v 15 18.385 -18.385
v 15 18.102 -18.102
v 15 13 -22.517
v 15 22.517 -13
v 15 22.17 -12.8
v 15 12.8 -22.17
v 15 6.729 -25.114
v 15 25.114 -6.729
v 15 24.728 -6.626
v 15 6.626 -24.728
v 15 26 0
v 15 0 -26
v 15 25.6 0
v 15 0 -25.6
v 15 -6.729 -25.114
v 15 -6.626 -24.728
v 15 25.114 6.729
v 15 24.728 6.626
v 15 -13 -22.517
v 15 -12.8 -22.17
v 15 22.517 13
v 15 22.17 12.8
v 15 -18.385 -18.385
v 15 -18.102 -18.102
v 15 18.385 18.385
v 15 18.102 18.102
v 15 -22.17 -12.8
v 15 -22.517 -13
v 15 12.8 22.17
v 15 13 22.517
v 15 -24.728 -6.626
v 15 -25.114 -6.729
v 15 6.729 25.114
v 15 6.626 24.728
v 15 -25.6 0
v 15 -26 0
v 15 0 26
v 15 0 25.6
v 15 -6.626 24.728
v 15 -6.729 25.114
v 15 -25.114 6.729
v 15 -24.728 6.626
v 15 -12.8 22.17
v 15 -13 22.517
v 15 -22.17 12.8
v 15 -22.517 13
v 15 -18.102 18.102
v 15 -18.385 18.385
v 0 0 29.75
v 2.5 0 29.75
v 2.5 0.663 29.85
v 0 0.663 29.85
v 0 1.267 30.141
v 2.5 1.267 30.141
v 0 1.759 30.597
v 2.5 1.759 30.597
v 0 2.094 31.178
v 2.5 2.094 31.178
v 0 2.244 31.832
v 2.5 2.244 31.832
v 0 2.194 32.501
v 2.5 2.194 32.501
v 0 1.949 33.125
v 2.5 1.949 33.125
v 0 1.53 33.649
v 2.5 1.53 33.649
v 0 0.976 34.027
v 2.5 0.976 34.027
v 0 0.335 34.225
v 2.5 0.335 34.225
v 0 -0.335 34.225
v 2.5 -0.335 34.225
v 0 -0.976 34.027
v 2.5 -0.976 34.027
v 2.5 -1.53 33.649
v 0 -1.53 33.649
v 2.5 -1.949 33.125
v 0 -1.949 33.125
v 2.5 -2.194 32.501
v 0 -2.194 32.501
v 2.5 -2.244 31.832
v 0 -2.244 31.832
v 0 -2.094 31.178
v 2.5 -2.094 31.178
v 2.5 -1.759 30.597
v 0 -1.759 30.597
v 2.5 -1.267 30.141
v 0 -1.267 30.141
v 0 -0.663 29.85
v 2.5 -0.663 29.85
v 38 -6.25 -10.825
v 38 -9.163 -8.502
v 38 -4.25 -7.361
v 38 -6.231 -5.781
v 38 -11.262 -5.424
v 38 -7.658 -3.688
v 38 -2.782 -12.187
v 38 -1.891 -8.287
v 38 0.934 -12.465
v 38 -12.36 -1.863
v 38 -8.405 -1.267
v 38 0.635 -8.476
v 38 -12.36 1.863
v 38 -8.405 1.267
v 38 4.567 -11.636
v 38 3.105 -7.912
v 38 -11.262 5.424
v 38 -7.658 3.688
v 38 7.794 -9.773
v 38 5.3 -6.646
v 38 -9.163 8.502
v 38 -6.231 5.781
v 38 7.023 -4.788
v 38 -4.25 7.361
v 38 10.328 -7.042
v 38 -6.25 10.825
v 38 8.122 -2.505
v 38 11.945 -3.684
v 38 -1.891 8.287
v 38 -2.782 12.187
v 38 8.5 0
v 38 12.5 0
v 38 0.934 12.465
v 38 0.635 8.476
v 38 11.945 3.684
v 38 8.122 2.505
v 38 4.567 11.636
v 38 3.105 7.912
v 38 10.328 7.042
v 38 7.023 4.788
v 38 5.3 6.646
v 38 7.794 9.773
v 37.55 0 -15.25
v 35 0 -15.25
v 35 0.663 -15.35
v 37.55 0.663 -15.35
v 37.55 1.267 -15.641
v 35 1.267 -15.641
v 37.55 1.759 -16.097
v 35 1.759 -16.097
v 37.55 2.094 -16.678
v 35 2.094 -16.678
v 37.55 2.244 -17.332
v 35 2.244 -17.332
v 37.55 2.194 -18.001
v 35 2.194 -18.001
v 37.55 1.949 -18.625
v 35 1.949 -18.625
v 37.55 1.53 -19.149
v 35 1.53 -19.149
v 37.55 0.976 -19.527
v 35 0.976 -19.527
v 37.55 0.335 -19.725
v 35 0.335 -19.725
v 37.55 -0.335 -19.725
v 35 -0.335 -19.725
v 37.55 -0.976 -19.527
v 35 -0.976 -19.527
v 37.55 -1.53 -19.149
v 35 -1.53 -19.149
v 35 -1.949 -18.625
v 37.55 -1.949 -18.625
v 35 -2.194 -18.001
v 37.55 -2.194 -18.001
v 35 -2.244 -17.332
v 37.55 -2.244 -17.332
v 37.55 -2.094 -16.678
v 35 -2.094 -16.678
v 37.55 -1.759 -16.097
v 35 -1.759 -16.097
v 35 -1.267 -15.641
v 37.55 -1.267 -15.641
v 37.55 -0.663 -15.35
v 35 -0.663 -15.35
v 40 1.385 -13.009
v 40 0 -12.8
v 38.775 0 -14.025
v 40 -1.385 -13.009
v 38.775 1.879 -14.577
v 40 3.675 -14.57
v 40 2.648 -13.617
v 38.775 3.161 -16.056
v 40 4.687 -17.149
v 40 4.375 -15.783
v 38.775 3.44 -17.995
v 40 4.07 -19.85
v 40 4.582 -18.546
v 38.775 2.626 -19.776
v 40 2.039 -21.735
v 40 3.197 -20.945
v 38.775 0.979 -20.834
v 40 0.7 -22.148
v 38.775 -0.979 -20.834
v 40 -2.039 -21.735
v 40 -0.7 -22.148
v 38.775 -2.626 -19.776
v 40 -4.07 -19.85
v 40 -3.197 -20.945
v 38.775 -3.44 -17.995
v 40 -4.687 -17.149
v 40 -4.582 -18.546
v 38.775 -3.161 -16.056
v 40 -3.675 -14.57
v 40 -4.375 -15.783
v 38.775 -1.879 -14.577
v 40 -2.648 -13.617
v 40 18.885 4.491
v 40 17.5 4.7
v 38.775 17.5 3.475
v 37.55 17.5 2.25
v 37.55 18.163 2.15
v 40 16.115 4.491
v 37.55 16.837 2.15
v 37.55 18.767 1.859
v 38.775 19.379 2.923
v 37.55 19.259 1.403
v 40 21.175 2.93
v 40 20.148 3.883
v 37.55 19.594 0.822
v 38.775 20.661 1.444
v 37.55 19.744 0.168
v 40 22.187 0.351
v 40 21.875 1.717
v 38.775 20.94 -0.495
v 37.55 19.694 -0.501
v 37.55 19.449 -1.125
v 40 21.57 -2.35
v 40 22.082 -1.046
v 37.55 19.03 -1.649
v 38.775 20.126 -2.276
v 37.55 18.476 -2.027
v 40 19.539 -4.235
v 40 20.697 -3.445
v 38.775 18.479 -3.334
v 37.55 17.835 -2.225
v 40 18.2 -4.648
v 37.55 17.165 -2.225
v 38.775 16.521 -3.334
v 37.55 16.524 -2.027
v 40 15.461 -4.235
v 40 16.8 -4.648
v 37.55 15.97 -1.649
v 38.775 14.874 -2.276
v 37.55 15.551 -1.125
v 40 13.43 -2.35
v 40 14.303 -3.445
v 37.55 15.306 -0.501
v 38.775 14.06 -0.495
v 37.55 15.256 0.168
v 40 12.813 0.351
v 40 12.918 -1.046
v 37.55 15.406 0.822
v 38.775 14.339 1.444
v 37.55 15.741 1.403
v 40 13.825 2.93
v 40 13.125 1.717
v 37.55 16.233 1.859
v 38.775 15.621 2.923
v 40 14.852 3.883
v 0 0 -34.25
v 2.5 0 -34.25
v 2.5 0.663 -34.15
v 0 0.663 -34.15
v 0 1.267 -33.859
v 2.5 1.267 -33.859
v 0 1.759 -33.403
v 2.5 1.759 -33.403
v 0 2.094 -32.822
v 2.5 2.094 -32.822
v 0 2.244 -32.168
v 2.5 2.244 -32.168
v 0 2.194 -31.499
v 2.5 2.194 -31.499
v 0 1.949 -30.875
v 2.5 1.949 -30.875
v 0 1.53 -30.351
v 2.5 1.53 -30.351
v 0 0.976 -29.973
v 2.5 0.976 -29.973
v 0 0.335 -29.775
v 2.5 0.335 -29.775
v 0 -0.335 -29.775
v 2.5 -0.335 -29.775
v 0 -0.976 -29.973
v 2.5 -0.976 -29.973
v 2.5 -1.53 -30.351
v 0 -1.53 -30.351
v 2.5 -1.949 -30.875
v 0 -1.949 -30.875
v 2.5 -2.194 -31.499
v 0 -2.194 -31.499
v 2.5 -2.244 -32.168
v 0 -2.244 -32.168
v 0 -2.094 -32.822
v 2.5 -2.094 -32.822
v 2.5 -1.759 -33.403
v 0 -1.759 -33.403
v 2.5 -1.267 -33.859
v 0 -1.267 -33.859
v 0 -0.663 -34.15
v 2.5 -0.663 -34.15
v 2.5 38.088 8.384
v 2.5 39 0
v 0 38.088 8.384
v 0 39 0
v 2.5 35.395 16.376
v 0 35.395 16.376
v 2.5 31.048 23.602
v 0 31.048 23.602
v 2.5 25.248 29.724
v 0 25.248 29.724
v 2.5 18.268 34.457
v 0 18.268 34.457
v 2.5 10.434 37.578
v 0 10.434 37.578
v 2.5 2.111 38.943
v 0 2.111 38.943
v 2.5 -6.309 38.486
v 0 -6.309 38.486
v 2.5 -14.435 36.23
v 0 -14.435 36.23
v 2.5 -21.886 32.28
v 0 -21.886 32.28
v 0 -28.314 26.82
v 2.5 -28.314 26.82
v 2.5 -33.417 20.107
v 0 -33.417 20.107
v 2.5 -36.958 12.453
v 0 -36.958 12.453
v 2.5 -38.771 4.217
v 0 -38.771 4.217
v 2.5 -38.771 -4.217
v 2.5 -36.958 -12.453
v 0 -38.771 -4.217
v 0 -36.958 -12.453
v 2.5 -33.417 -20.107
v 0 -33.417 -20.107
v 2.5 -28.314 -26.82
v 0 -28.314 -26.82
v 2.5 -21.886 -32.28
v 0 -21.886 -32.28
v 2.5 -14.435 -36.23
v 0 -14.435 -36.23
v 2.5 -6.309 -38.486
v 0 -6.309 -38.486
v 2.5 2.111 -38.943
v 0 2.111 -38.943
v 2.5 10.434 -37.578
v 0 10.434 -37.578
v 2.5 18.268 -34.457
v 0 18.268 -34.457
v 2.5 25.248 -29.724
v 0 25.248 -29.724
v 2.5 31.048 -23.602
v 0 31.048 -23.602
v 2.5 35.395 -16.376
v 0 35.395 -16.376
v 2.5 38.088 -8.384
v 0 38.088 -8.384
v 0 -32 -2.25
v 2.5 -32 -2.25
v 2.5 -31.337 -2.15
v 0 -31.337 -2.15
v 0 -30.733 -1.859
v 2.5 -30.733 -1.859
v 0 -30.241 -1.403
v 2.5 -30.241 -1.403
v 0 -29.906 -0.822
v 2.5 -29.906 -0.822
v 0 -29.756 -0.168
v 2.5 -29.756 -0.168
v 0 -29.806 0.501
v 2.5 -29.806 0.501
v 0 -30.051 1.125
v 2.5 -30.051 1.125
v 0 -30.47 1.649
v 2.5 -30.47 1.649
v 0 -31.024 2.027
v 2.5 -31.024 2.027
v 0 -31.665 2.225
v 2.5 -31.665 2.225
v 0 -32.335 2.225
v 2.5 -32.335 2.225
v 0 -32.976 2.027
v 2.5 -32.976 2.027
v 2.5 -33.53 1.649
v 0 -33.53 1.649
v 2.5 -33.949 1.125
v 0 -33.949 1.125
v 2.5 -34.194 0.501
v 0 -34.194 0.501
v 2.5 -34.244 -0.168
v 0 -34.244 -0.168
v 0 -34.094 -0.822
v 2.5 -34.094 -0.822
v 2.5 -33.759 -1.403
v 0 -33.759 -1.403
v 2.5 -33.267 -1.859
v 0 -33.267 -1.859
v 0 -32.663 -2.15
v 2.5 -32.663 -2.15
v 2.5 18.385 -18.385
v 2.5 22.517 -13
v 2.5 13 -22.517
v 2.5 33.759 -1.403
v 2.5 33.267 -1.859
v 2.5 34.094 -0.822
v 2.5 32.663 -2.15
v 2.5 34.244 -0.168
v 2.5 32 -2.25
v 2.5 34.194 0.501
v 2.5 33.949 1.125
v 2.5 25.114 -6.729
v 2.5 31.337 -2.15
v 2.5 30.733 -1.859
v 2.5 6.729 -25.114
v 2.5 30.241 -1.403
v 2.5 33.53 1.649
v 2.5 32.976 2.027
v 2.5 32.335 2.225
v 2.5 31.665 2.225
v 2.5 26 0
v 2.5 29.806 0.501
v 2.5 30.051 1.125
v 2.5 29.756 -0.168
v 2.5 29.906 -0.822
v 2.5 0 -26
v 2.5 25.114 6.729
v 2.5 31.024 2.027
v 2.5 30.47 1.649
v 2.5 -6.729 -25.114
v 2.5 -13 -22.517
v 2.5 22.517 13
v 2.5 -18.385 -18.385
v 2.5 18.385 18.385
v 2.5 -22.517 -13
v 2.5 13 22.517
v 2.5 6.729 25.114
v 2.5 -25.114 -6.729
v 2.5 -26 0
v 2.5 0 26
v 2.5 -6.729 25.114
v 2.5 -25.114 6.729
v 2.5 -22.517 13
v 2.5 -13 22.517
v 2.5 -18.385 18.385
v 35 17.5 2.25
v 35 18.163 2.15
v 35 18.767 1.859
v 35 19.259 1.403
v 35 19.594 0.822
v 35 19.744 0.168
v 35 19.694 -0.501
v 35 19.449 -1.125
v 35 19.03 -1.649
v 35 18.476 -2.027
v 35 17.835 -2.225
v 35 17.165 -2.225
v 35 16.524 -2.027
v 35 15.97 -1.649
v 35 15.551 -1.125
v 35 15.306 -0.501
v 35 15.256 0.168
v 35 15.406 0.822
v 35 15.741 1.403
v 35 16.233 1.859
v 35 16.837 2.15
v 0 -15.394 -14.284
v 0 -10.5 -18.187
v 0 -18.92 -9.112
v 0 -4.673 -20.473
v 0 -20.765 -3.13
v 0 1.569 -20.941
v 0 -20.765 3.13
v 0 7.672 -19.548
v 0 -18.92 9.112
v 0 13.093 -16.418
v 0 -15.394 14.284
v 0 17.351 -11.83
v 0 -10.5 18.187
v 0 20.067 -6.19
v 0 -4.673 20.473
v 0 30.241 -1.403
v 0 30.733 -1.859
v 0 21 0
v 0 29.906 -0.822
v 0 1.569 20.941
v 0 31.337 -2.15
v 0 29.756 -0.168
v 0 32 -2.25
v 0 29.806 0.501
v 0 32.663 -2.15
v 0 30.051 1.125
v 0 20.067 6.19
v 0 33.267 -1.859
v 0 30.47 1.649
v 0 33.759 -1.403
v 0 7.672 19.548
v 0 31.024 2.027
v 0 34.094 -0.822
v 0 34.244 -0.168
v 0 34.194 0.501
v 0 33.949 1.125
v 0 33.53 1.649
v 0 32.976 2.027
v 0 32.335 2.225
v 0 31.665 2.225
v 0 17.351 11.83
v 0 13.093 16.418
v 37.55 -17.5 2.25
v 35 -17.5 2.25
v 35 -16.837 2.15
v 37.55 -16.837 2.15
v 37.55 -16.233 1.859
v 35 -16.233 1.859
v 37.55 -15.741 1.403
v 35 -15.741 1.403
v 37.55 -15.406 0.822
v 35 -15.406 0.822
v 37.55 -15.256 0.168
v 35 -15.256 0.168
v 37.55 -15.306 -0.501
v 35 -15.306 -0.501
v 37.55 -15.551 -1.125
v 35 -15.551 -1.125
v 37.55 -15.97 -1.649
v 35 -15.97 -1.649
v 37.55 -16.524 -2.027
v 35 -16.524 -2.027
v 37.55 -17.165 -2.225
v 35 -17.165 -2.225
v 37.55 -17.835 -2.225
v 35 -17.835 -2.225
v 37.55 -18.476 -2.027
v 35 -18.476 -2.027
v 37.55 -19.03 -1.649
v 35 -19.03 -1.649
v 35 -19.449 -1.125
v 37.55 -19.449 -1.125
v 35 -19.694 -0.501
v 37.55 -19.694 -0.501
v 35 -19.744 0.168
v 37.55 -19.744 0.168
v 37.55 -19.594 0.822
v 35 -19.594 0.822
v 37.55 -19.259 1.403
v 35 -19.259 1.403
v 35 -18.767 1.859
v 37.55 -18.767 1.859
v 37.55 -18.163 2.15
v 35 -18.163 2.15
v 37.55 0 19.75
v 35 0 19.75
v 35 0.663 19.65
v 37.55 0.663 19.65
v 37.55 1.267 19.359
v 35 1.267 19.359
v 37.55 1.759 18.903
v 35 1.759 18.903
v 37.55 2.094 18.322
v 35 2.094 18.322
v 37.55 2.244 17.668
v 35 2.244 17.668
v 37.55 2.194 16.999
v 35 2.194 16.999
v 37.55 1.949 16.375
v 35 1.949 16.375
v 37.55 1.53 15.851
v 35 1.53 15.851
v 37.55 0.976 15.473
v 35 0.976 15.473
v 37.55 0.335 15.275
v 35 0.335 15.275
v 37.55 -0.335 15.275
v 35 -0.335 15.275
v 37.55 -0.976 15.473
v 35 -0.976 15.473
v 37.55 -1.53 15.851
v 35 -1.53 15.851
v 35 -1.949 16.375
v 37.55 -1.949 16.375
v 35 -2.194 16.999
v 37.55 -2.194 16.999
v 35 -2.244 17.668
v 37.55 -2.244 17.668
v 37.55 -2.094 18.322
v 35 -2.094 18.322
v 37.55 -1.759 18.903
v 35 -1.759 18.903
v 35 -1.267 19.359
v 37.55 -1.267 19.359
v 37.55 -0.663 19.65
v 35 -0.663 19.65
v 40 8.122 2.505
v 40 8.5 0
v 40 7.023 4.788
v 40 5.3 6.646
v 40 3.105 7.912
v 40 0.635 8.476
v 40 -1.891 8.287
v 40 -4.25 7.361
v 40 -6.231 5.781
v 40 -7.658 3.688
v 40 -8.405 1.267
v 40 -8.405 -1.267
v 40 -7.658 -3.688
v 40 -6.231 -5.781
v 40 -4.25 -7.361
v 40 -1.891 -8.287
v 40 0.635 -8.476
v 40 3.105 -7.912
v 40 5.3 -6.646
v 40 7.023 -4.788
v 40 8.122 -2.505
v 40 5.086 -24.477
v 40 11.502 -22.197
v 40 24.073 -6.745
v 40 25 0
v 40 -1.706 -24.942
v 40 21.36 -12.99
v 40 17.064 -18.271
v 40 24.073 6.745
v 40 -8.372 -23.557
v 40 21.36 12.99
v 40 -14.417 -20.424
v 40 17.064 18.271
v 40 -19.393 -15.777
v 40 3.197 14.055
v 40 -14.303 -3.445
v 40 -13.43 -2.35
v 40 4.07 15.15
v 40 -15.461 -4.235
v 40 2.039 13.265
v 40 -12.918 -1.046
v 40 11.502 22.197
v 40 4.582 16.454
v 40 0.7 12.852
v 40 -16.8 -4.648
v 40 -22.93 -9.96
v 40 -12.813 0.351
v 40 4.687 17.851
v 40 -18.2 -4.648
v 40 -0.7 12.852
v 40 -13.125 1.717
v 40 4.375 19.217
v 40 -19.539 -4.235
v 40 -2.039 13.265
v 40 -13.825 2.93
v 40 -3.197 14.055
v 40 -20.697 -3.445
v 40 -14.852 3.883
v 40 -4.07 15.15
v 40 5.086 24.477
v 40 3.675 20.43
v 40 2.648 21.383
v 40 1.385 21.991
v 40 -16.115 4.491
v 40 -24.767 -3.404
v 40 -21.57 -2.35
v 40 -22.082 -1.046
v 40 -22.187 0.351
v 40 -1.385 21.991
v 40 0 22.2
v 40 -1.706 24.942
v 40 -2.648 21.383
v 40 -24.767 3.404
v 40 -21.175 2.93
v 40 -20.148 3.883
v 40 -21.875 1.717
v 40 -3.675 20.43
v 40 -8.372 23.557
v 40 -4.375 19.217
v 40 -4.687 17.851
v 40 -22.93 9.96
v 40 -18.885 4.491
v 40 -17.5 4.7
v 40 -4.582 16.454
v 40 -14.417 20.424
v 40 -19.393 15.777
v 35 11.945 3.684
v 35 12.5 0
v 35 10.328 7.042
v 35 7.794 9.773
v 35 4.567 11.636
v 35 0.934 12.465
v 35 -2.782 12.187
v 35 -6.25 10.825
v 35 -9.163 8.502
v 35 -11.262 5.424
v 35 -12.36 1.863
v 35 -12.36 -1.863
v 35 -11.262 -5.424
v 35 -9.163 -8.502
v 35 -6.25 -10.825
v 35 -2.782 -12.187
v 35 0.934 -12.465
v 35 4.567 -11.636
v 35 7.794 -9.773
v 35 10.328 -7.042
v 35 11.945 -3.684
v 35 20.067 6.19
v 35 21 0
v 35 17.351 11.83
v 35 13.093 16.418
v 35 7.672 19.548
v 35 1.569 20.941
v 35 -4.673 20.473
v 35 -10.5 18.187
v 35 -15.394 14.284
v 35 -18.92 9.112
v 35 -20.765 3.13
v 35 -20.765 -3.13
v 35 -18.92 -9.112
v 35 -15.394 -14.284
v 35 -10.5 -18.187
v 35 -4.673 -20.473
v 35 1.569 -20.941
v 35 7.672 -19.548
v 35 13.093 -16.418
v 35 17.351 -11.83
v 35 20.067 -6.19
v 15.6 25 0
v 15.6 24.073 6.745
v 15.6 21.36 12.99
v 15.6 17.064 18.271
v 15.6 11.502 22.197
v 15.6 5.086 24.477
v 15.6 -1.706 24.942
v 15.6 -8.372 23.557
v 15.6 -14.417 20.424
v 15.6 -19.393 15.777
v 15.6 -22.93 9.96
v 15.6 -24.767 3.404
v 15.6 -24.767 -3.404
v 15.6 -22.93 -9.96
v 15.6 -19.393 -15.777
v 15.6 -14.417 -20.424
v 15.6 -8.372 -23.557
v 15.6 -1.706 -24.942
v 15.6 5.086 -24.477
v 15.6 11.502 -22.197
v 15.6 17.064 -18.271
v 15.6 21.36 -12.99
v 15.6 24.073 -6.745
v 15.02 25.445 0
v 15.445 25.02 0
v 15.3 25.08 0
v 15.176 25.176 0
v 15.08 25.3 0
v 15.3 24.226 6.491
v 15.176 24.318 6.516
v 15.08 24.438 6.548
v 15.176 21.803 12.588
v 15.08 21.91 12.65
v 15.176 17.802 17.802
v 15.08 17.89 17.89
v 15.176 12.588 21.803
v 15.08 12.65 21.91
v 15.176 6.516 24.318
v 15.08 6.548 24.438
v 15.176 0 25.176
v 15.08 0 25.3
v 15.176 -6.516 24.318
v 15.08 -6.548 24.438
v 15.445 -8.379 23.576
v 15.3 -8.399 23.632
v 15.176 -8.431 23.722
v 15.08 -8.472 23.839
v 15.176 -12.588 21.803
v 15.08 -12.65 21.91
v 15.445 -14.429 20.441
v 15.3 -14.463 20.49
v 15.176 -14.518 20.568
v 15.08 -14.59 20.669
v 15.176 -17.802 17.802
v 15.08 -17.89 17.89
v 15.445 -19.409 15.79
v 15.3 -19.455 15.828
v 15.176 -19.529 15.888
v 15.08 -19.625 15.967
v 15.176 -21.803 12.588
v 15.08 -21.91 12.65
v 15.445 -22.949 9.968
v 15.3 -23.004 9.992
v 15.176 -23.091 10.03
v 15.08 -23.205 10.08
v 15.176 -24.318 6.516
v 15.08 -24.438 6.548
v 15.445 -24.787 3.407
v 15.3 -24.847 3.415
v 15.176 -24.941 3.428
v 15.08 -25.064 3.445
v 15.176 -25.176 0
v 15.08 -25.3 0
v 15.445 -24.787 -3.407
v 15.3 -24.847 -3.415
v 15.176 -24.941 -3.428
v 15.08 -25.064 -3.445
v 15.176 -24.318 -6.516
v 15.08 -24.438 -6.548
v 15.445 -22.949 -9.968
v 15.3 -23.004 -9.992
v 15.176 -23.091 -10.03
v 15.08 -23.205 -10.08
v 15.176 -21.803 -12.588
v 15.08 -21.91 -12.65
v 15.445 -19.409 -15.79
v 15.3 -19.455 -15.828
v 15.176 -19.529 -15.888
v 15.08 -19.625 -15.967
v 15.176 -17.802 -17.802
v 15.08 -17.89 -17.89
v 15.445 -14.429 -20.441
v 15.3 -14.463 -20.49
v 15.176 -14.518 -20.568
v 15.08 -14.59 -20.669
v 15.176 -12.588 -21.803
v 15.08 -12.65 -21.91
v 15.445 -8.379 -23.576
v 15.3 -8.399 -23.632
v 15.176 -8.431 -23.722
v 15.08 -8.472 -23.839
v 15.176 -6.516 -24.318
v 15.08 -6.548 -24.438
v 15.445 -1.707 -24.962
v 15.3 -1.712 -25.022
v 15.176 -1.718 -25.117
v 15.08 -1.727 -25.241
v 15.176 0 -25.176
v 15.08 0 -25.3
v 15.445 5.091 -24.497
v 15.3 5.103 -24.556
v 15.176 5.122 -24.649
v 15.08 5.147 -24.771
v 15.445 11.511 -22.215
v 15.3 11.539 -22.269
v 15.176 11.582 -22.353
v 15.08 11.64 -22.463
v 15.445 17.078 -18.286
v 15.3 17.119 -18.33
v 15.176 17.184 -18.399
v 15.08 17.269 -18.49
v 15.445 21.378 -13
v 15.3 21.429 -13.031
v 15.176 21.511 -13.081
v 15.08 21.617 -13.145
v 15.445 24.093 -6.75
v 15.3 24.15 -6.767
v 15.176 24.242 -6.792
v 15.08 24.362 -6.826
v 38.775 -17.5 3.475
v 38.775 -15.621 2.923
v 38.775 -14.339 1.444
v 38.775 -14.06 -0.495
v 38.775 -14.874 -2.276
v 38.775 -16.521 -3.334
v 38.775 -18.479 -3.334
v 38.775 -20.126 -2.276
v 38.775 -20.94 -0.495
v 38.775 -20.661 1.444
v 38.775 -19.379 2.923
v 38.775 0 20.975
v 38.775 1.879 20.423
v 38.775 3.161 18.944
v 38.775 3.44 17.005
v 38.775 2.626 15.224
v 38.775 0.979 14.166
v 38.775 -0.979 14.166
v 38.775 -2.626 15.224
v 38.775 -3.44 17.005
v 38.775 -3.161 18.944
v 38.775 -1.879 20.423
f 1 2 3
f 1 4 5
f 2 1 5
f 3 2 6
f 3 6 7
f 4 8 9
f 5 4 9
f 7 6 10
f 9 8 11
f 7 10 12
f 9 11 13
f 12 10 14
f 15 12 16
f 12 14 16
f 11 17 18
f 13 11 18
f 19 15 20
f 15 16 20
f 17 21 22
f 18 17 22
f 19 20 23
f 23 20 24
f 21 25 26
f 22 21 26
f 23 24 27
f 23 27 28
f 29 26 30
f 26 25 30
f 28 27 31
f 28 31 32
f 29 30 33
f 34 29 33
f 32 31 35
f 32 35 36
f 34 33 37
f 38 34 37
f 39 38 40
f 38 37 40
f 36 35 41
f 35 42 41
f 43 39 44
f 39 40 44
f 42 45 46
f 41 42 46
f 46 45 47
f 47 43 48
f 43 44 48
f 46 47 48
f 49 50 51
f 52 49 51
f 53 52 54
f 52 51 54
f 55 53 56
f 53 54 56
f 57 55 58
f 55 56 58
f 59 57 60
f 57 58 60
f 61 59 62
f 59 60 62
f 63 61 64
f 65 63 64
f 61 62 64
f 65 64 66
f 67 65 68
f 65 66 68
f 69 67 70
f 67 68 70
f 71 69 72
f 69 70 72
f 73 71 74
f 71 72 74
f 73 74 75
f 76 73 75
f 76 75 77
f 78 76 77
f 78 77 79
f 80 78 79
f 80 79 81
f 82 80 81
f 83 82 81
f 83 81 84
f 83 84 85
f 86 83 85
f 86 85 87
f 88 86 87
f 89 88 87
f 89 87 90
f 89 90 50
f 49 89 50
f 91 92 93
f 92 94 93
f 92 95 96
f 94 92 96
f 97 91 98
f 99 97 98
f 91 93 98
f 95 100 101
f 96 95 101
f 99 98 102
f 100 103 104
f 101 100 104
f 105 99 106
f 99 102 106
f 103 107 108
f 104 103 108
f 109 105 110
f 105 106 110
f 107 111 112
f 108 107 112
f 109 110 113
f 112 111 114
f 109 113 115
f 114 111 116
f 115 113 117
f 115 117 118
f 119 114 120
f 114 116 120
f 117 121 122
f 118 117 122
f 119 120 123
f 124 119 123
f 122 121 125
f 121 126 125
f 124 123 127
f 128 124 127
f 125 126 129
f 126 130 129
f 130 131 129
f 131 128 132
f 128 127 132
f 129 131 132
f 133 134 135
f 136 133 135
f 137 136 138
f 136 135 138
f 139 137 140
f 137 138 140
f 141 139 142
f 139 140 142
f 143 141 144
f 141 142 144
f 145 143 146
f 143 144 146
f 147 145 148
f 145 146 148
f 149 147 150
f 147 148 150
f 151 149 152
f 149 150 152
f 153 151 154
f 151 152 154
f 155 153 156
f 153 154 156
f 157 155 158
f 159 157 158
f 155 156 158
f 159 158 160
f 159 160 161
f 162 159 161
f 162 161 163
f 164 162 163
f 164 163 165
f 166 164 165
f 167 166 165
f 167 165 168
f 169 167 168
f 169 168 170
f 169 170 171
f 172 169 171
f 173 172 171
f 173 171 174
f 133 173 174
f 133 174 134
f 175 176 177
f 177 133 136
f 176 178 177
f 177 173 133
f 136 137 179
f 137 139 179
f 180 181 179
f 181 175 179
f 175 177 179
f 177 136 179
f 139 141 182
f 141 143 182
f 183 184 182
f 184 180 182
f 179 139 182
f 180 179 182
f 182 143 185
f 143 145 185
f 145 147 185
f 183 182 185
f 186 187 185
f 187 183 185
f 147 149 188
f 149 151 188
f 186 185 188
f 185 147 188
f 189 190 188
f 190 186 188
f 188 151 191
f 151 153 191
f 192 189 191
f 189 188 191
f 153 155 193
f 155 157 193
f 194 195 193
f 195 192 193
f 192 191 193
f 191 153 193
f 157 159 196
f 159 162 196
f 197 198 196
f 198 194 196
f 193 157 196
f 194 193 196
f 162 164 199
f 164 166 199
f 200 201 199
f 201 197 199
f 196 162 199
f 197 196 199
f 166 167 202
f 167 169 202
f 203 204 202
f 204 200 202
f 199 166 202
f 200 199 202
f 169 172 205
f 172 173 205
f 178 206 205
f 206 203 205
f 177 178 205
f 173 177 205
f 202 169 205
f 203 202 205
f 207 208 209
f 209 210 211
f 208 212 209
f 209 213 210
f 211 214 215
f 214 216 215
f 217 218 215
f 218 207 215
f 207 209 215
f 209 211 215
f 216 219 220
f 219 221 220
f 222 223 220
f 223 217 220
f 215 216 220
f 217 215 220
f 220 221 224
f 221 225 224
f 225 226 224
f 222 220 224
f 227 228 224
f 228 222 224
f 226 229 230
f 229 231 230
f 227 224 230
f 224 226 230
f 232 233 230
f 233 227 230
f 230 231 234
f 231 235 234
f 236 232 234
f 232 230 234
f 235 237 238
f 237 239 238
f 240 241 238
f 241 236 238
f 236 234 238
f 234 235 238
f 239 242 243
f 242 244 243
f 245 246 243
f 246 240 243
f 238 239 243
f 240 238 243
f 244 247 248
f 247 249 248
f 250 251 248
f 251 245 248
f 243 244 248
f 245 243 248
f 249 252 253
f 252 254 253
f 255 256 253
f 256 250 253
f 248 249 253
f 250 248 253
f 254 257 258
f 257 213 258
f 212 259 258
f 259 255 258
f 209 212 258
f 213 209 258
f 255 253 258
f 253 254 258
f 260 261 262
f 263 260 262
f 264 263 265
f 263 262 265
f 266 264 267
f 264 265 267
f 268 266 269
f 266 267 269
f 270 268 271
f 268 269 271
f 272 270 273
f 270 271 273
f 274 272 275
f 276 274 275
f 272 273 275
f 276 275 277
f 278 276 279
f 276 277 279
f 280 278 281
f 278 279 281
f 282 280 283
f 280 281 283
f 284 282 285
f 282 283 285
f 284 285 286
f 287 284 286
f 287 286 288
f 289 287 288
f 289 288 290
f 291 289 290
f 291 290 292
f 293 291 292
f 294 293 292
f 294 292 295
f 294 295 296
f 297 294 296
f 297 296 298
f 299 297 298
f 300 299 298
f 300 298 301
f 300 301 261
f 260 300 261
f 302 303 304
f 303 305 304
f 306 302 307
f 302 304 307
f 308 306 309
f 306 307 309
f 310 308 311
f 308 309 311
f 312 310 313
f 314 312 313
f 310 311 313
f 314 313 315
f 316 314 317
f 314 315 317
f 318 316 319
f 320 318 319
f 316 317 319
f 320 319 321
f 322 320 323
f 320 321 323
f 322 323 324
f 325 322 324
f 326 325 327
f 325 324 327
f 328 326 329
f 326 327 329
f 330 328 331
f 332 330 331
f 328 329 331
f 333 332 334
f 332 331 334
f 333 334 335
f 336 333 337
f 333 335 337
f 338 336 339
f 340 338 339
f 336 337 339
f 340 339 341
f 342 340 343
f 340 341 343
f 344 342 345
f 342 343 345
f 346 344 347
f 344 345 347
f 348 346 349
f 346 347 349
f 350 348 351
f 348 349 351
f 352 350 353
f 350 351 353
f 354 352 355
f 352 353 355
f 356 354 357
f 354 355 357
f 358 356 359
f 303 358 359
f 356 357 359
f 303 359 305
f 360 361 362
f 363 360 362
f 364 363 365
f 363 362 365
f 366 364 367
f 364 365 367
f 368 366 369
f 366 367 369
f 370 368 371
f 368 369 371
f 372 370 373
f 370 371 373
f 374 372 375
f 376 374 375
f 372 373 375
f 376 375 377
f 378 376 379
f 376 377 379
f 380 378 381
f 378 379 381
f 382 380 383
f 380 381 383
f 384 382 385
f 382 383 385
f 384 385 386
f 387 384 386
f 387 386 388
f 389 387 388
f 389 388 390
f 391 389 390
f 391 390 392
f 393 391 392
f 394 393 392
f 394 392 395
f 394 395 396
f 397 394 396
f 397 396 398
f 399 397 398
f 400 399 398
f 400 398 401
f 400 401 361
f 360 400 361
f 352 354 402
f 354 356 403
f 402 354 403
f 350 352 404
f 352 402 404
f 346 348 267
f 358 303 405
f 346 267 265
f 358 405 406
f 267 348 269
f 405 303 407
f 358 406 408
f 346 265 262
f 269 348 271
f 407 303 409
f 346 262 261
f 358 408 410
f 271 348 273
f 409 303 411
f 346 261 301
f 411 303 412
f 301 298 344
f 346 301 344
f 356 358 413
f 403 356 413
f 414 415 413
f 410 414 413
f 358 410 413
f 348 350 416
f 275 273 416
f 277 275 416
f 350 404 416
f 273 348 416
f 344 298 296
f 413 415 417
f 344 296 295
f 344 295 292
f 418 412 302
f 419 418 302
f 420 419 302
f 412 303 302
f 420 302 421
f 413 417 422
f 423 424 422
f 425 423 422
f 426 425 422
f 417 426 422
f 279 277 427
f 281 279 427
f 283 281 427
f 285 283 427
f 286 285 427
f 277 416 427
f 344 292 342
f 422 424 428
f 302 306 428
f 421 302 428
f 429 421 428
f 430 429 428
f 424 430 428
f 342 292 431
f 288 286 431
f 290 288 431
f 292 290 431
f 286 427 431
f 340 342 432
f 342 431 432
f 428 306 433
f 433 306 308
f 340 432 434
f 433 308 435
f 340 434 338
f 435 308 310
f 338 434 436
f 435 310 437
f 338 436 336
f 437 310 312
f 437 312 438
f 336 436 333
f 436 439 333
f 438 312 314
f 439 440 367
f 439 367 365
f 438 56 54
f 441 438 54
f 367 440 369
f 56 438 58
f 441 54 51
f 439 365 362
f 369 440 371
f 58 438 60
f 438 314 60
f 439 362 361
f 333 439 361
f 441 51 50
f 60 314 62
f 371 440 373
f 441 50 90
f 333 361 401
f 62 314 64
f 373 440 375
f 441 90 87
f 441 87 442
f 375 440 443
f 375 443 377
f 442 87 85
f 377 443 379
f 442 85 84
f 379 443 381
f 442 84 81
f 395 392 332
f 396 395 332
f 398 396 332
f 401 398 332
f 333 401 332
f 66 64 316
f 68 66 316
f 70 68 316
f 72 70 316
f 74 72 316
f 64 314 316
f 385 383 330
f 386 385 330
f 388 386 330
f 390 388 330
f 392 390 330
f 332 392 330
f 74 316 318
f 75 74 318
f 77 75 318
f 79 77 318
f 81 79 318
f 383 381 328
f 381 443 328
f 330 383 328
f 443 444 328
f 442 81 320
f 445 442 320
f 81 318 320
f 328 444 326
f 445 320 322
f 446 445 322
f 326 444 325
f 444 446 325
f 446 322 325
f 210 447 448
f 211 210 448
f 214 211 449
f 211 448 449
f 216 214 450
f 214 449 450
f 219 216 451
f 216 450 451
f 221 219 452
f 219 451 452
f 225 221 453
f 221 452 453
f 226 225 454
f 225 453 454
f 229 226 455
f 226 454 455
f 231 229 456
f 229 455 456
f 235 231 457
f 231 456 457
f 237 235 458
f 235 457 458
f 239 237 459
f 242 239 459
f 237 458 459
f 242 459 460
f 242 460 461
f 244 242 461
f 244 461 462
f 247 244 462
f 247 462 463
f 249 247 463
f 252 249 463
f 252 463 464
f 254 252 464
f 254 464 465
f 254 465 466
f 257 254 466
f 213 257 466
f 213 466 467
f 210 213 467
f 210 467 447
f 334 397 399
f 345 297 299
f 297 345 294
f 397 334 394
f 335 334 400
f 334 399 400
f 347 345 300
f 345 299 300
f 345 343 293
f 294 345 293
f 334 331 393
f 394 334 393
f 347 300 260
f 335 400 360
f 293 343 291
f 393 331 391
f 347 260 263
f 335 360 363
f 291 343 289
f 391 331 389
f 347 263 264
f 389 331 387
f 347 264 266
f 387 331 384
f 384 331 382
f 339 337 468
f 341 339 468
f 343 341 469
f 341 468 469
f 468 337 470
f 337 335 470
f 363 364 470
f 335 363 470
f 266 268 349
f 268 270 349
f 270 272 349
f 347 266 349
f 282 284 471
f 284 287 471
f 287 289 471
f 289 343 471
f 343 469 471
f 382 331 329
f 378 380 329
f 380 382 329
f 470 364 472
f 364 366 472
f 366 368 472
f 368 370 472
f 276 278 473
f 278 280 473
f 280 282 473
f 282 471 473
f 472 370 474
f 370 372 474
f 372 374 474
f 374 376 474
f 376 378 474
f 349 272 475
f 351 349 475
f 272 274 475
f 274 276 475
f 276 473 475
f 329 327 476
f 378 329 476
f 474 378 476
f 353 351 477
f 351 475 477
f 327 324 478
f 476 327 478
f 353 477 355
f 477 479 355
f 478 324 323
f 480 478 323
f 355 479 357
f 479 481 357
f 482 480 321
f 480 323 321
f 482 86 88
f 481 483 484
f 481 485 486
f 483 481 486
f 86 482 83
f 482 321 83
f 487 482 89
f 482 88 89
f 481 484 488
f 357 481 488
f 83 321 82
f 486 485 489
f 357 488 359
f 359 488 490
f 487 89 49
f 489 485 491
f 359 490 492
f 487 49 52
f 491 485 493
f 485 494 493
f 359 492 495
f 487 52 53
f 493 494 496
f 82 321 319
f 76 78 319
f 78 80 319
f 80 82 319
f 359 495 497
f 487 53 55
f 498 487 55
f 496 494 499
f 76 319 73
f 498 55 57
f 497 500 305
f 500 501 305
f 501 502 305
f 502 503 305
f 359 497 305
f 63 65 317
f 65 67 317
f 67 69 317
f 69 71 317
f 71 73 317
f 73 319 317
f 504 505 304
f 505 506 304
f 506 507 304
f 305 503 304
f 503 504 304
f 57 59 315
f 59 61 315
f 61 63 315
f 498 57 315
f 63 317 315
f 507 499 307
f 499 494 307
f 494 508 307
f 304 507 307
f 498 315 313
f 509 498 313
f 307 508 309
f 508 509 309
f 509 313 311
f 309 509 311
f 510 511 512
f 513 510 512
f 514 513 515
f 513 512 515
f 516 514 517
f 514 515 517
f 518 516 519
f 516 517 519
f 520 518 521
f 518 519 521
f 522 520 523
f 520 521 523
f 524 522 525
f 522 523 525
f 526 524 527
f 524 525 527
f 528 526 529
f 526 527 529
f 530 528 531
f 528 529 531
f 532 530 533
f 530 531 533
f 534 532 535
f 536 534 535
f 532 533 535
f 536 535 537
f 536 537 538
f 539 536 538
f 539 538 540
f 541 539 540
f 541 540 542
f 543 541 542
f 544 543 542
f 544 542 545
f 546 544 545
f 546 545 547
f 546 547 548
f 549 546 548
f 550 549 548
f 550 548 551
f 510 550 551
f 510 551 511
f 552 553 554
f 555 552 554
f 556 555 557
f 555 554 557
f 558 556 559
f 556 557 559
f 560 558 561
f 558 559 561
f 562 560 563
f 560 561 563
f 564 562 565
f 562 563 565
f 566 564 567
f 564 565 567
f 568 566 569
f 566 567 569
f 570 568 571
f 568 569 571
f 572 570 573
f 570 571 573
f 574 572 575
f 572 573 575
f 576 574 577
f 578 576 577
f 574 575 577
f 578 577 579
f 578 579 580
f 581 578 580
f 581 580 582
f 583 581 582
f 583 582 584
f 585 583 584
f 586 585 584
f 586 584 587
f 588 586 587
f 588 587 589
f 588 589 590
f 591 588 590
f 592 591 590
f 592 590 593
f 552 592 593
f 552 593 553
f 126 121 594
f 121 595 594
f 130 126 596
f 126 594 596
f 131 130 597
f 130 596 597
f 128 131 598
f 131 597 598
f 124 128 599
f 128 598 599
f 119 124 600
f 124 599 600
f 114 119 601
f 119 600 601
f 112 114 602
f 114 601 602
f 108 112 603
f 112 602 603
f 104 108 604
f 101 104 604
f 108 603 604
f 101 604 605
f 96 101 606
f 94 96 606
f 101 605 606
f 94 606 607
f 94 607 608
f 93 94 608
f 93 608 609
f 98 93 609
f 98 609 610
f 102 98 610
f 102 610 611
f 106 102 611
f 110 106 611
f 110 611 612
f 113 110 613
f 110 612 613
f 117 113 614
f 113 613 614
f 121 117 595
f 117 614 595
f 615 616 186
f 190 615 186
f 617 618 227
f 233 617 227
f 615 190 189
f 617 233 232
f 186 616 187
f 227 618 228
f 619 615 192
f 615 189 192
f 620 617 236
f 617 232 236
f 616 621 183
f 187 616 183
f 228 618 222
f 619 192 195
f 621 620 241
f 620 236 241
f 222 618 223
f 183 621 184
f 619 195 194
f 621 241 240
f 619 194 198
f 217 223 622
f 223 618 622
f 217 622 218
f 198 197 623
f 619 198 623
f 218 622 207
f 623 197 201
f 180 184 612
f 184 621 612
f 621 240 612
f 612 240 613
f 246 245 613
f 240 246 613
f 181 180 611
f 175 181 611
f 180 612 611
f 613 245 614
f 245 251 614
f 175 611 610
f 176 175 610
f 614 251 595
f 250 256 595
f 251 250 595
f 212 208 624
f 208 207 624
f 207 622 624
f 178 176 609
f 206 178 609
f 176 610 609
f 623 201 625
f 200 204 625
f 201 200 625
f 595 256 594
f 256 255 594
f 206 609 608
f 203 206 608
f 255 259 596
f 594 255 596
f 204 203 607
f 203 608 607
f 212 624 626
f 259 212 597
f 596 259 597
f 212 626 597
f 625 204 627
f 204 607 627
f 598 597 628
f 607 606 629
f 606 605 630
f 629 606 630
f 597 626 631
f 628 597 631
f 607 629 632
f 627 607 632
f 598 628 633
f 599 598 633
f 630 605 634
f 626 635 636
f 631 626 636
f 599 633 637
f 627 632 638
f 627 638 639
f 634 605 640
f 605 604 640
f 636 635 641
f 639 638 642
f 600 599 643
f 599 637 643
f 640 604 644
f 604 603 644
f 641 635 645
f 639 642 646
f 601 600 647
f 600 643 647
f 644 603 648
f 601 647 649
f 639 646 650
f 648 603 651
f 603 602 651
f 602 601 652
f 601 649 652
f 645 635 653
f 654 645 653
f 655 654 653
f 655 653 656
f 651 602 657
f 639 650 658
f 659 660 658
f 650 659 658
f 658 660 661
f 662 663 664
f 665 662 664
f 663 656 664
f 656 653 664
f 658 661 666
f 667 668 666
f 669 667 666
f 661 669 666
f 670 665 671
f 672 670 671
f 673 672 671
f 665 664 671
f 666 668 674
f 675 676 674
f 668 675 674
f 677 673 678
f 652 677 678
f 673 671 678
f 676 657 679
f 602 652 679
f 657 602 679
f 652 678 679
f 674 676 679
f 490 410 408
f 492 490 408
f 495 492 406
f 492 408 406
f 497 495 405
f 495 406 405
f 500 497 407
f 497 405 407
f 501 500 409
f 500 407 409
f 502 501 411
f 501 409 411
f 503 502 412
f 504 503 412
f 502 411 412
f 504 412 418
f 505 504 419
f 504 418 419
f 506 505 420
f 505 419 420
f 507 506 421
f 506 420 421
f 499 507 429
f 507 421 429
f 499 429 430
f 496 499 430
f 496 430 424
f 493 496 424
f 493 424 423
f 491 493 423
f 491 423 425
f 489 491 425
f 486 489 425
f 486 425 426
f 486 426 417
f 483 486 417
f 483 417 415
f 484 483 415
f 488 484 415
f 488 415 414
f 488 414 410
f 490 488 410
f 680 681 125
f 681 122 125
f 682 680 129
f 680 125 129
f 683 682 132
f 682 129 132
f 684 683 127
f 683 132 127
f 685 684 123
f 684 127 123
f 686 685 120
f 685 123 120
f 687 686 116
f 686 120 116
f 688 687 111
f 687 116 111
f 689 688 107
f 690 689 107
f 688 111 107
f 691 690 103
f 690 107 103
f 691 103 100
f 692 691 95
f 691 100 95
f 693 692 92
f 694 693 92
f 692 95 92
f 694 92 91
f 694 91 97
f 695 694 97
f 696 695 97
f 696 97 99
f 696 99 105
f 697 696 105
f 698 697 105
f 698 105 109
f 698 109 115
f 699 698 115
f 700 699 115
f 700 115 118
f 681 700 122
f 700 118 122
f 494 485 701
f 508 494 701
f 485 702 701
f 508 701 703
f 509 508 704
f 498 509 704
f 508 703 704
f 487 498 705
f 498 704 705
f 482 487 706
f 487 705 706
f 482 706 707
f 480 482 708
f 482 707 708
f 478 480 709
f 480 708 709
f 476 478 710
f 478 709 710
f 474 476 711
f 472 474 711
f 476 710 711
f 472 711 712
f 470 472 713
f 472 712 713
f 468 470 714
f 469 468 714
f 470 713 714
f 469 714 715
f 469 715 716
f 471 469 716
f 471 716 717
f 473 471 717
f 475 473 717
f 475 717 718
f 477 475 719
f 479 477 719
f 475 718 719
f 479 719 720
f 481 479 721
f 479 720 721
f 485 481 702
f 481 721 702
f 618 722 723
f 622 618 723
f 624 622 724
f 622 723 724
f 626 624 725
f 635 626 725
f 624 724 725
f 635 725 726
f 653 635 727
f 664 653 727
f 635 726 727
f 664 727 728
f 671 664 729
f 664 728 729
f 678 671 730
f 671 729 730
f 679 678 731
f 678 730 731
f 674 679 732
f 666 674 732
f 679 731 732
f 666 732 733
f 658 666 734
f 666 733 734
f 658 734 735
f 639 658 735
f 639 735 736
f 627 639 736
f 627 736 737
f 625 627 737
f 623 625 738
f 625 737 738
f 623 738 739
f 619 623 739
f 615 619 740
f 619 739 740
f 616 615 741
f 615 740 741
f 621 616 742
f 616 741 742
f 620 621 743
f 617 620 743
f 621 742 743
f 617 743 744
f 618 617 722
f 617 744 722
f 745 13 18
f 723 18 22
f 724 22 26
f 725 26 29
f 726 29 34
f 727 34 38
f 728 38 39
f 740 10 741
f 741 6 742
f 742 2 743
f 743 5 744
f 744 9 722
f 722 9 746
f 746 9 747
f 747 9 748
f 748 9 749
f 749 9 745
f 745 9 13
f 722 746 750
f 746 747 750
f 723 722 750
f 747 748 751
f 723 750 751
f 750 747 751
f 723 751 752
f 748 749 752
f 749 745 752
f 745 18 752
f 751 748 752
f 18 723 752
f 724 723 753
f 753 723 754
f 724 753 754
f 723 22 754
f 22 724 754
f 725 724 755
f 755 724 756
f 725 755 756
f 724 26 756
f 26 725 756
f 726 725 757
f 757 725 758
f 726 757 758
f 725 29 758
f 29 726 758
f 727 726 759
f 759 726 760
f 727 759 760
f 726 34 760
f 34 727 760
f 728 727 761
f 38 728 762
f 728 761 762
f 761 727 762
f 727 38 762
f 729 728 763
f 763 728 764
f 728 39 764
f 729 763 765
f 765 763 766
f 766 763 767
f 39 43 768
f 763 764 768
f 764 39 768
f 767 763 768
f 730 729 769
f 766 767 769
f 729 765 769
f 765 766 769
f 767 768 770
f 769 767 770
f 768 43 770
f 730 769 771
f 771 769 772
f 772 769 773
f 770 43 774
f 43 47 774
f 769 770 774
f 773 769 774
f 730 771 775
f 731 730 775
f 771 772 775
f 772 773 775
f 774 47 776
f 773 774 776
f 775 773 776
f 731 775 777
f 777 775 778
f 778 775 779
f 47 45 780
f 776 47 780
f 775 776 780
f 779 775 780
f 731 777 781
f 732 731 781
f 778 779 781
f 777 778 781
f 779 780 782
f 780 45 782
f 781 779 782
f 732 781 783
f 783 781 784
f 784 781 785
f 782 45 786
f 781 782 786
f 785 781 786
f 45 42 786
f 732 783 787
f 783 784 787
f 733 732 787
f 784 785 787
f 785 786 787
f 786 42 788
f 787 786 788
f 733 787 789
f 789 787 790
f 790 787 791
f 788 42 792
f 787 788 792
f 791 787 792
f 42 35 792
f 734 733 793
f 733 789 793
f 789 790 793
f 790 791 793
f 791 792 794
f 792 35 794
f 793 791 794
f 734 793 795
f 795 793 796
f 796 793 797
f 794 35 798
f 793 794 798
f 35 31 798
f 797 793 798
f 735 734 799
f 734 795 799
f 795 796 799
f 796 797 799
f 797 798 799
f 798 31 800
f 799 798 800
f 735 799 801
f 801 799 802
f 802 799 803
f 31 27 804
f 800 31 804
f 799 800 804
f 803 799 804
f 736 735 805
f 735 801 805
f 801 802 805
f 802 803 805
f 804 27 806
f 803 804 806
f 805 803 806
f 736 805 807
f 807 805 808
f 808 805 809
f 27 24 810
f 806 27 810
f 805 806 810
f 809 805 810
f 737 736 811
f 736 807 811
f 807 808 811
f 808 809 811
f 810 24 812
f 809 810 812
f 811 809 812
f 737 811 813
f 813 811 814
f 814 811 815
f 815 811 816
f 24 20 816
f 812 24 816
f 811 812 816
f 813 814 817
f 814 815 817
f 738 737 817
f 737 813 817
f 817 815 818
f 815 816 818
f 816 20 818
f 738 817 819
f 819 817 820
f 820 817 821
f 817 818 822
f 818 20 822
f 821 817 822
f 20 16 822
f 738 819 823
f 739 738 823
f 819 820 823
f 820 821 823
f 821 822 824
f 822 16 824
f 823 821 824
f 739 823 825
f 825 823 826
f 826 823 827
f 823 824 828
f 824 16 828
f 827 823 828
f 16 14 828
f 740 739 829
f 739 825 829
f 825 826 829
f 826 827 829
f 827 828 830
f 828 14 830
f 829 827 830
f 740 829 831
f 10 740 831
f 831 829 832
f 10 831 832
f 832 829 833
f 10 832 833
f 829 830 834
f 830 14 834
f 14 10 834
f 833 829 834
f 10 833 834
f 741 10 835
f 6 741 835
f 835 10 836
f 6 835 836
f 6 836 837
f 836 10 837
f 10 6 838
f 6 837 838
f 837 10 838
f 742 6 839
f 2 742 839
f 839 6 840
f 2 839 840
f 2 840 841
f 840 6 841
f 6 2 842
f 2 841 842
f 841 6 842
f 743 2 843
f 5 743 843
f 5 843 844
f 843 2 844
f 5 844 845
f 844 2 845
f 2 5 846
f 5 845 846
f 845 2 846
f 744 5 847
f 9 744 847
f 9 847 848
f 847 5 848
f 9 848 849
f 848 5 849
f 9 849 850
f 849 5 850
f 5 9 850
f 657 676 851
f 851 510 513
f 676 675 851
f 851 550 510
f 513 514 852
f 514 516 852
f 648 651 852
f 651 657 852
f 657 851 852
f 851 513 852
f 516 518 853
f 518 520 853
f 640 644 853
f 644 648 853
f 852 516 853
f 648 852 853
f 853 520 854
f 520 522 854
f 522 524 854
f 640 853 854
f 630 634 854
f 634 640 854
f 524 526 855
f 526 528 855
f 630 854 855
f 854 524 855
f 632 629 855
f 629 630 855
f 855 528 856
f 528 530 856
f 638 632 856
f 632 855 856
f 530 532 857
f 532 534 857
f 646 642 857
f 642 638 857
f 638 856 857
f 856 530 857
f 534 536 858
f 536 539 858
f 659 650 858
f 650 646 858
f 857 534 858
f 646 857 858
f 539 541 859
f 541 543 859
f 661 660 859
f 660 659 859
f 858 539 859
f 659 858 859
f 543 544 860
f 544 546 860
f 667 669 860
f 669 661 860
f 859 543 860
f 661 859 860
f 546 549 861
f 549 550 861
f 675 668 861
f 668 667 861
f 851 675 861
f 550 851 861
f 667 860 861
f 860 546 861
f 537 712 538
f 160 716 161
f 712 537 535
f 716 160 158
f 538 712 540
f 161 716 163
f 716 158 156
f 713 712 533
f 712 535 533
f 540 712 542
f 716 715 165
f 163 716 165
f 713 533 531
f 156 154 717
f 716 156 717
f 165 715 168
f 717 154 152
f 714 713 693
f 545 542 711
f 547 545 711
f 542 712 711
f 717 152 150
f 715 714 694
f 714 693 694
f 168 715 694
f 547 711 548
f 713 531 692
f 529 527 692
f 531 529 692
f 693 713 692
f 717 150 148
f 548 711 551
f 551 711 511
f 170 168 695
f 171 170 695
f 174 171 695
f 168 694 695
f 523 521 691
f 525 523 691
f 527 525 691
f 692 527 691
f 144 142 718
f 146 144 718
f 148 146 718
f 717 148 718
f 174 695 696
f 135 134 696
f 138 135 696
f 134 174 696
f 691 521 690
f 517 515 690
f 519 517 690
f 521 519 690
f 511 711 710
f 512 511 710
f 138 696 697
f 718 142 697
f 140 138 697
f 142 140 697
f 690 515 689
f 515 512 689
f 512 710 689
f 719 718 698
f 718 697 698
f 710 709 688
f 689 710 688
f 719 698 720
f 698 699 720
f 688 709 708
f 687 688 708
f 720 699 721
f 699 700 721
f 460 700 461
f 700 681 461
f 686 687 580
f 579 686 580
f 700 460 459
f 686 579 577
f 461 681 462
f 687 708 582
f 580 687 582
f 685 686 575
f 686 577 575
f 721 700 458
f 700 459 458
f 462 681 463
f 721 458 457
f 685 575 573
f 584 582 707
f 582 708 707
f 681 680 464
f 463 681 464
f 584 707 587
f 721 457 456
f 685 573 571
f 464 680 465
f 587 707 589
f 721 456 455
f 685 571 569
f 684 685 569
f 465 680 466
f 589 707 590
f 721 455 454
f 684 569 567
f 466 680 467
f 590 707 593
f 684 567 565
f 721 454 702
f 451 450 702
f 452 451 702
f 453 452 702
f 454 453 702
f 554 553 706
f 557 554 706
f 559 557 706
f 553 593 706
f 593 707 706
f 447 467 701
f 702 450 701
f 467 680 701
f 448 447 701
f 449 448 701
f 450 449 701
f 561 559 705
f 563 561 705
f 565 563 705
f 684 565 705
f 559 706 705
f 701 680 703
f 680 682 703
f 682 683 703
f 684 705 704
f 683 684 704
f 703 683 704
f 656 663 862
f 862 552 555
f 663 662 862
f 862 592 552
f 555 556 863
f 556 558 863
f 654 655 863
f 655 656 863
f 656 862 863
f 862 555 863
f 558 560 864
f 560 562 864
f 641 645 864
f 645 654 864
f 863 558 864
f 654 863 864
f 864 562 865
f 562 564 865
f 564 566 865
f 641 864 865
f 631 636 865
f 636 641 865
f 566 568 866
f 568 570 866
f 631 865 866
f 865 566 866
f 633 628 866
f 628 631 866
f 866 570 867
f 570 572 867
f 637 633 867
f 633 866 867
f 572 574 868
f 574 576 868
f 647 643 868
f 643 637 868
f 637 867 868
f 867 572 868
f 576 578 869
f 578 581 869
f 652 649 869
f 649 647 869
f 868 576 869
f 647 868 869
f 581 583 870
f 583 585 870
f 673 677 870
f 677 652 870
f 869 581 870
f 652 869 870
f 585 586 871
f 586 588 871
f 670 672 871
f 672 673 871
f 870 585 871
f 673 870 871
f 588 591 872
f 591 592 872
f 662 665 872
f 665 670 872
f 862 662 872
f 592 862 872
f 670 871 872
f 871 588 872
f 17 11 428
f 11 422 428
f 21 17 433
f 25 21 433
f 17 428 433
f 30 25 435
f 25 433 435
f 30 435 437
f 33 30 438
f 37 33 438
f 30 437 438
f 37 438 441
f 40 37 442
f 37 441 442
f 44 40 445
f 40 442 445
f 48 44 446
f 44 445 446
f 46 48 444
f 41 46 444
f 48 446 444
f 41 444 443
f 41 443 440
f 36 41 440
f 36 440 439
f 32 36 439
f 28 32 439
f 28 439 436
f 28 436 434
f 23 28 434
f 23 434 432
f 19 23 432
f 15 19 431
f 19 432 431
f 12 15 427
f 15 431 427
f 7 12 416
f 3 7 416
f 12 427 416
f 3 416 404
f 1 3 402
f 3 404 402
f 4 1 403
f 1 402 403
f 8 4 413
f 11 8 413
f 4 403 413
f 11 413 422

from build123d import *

# Parameters (mm, degrees)
CSK_FOR_M4_FLAT_HEAD_MACHINE_SCREW1_D           = 4.5
CSK_FOR_M4_FLAT_HEAD_MACHINE_SCREW1_DEPTH       = 5
CSK_FOR_M4_FLAT_HEAD_MACHINE_SCREW1_CSINK_D     = 9.4
CSK_FOR_M4_FLAT_HEAD_MACHINE_SCREW1_CSINK_ANGLE = 90
FILLET1_R                                       = 0.6
M4_CLEARANCE_HOLE1_D                            = 4.5
M4_CLEARANCE_HOLE1_DEPTH                        = 2.5


with BuildPart() as part:
    # Sketch2 → Revolve1 (revolve)
    with BuildSketch(Plane.XY):
        Polygon((0, 21), (35, 21), (35, 12.5), (38, 12.5), (38, 8.5), (40, 8.5), (40, 25), (15, 25), (15, 26), (2.5, 26), (2.5, 39), (0, 39), (0, 26), align=None)
    revolve(axis=Axis((-64.103352454, 0, 0), (1, 0, 0)))

    # CSK for M4 Flat Head Machine Screw1
    with Locations(Plane(origin=(40, 0, 0), x_dir=(0, 0, -1), z_dir=(1, 0, 0))):
        with Locations((0, 17.5), (17.5, 0), (0, -17.5), (-17.5, 0)):
            CounterSinkHole(CSK_FOR_M4_FLAT_HEAD_MACHINE_SCREW1_D / 2, CSK_FOR_M4_FLAT_HEAD_MACHINE_SCREW1_CSINK_D / 2, depth=CSK_FOR_M4_FLAT_HEAD_MACHINE_SCREW1_DEPTH, counter_sink_angle=CSK_FOR_M4_FLAT_HEAD_MACHINE_SCREW1_CSINK_ANGLE)

    # Fillet1
    fillet1_edges = [part.edges().sort_by_distance(p)[0] for p in [
        (15, -25, 0),
    ]]
    fillet(fillet1_edges, radius=FILLET1_R)

    # M4 Clearance Hole1
    with Locations(Plane.ZY):
        with Locations((0, 32), (0, -32), (32, 0), (-32, 0)):
            Hole(M4_CLEARANCE_HOLE1_D / 2, depth=M4_CLEARANCE_HOLE1_DEPTH)


solid = part.part
